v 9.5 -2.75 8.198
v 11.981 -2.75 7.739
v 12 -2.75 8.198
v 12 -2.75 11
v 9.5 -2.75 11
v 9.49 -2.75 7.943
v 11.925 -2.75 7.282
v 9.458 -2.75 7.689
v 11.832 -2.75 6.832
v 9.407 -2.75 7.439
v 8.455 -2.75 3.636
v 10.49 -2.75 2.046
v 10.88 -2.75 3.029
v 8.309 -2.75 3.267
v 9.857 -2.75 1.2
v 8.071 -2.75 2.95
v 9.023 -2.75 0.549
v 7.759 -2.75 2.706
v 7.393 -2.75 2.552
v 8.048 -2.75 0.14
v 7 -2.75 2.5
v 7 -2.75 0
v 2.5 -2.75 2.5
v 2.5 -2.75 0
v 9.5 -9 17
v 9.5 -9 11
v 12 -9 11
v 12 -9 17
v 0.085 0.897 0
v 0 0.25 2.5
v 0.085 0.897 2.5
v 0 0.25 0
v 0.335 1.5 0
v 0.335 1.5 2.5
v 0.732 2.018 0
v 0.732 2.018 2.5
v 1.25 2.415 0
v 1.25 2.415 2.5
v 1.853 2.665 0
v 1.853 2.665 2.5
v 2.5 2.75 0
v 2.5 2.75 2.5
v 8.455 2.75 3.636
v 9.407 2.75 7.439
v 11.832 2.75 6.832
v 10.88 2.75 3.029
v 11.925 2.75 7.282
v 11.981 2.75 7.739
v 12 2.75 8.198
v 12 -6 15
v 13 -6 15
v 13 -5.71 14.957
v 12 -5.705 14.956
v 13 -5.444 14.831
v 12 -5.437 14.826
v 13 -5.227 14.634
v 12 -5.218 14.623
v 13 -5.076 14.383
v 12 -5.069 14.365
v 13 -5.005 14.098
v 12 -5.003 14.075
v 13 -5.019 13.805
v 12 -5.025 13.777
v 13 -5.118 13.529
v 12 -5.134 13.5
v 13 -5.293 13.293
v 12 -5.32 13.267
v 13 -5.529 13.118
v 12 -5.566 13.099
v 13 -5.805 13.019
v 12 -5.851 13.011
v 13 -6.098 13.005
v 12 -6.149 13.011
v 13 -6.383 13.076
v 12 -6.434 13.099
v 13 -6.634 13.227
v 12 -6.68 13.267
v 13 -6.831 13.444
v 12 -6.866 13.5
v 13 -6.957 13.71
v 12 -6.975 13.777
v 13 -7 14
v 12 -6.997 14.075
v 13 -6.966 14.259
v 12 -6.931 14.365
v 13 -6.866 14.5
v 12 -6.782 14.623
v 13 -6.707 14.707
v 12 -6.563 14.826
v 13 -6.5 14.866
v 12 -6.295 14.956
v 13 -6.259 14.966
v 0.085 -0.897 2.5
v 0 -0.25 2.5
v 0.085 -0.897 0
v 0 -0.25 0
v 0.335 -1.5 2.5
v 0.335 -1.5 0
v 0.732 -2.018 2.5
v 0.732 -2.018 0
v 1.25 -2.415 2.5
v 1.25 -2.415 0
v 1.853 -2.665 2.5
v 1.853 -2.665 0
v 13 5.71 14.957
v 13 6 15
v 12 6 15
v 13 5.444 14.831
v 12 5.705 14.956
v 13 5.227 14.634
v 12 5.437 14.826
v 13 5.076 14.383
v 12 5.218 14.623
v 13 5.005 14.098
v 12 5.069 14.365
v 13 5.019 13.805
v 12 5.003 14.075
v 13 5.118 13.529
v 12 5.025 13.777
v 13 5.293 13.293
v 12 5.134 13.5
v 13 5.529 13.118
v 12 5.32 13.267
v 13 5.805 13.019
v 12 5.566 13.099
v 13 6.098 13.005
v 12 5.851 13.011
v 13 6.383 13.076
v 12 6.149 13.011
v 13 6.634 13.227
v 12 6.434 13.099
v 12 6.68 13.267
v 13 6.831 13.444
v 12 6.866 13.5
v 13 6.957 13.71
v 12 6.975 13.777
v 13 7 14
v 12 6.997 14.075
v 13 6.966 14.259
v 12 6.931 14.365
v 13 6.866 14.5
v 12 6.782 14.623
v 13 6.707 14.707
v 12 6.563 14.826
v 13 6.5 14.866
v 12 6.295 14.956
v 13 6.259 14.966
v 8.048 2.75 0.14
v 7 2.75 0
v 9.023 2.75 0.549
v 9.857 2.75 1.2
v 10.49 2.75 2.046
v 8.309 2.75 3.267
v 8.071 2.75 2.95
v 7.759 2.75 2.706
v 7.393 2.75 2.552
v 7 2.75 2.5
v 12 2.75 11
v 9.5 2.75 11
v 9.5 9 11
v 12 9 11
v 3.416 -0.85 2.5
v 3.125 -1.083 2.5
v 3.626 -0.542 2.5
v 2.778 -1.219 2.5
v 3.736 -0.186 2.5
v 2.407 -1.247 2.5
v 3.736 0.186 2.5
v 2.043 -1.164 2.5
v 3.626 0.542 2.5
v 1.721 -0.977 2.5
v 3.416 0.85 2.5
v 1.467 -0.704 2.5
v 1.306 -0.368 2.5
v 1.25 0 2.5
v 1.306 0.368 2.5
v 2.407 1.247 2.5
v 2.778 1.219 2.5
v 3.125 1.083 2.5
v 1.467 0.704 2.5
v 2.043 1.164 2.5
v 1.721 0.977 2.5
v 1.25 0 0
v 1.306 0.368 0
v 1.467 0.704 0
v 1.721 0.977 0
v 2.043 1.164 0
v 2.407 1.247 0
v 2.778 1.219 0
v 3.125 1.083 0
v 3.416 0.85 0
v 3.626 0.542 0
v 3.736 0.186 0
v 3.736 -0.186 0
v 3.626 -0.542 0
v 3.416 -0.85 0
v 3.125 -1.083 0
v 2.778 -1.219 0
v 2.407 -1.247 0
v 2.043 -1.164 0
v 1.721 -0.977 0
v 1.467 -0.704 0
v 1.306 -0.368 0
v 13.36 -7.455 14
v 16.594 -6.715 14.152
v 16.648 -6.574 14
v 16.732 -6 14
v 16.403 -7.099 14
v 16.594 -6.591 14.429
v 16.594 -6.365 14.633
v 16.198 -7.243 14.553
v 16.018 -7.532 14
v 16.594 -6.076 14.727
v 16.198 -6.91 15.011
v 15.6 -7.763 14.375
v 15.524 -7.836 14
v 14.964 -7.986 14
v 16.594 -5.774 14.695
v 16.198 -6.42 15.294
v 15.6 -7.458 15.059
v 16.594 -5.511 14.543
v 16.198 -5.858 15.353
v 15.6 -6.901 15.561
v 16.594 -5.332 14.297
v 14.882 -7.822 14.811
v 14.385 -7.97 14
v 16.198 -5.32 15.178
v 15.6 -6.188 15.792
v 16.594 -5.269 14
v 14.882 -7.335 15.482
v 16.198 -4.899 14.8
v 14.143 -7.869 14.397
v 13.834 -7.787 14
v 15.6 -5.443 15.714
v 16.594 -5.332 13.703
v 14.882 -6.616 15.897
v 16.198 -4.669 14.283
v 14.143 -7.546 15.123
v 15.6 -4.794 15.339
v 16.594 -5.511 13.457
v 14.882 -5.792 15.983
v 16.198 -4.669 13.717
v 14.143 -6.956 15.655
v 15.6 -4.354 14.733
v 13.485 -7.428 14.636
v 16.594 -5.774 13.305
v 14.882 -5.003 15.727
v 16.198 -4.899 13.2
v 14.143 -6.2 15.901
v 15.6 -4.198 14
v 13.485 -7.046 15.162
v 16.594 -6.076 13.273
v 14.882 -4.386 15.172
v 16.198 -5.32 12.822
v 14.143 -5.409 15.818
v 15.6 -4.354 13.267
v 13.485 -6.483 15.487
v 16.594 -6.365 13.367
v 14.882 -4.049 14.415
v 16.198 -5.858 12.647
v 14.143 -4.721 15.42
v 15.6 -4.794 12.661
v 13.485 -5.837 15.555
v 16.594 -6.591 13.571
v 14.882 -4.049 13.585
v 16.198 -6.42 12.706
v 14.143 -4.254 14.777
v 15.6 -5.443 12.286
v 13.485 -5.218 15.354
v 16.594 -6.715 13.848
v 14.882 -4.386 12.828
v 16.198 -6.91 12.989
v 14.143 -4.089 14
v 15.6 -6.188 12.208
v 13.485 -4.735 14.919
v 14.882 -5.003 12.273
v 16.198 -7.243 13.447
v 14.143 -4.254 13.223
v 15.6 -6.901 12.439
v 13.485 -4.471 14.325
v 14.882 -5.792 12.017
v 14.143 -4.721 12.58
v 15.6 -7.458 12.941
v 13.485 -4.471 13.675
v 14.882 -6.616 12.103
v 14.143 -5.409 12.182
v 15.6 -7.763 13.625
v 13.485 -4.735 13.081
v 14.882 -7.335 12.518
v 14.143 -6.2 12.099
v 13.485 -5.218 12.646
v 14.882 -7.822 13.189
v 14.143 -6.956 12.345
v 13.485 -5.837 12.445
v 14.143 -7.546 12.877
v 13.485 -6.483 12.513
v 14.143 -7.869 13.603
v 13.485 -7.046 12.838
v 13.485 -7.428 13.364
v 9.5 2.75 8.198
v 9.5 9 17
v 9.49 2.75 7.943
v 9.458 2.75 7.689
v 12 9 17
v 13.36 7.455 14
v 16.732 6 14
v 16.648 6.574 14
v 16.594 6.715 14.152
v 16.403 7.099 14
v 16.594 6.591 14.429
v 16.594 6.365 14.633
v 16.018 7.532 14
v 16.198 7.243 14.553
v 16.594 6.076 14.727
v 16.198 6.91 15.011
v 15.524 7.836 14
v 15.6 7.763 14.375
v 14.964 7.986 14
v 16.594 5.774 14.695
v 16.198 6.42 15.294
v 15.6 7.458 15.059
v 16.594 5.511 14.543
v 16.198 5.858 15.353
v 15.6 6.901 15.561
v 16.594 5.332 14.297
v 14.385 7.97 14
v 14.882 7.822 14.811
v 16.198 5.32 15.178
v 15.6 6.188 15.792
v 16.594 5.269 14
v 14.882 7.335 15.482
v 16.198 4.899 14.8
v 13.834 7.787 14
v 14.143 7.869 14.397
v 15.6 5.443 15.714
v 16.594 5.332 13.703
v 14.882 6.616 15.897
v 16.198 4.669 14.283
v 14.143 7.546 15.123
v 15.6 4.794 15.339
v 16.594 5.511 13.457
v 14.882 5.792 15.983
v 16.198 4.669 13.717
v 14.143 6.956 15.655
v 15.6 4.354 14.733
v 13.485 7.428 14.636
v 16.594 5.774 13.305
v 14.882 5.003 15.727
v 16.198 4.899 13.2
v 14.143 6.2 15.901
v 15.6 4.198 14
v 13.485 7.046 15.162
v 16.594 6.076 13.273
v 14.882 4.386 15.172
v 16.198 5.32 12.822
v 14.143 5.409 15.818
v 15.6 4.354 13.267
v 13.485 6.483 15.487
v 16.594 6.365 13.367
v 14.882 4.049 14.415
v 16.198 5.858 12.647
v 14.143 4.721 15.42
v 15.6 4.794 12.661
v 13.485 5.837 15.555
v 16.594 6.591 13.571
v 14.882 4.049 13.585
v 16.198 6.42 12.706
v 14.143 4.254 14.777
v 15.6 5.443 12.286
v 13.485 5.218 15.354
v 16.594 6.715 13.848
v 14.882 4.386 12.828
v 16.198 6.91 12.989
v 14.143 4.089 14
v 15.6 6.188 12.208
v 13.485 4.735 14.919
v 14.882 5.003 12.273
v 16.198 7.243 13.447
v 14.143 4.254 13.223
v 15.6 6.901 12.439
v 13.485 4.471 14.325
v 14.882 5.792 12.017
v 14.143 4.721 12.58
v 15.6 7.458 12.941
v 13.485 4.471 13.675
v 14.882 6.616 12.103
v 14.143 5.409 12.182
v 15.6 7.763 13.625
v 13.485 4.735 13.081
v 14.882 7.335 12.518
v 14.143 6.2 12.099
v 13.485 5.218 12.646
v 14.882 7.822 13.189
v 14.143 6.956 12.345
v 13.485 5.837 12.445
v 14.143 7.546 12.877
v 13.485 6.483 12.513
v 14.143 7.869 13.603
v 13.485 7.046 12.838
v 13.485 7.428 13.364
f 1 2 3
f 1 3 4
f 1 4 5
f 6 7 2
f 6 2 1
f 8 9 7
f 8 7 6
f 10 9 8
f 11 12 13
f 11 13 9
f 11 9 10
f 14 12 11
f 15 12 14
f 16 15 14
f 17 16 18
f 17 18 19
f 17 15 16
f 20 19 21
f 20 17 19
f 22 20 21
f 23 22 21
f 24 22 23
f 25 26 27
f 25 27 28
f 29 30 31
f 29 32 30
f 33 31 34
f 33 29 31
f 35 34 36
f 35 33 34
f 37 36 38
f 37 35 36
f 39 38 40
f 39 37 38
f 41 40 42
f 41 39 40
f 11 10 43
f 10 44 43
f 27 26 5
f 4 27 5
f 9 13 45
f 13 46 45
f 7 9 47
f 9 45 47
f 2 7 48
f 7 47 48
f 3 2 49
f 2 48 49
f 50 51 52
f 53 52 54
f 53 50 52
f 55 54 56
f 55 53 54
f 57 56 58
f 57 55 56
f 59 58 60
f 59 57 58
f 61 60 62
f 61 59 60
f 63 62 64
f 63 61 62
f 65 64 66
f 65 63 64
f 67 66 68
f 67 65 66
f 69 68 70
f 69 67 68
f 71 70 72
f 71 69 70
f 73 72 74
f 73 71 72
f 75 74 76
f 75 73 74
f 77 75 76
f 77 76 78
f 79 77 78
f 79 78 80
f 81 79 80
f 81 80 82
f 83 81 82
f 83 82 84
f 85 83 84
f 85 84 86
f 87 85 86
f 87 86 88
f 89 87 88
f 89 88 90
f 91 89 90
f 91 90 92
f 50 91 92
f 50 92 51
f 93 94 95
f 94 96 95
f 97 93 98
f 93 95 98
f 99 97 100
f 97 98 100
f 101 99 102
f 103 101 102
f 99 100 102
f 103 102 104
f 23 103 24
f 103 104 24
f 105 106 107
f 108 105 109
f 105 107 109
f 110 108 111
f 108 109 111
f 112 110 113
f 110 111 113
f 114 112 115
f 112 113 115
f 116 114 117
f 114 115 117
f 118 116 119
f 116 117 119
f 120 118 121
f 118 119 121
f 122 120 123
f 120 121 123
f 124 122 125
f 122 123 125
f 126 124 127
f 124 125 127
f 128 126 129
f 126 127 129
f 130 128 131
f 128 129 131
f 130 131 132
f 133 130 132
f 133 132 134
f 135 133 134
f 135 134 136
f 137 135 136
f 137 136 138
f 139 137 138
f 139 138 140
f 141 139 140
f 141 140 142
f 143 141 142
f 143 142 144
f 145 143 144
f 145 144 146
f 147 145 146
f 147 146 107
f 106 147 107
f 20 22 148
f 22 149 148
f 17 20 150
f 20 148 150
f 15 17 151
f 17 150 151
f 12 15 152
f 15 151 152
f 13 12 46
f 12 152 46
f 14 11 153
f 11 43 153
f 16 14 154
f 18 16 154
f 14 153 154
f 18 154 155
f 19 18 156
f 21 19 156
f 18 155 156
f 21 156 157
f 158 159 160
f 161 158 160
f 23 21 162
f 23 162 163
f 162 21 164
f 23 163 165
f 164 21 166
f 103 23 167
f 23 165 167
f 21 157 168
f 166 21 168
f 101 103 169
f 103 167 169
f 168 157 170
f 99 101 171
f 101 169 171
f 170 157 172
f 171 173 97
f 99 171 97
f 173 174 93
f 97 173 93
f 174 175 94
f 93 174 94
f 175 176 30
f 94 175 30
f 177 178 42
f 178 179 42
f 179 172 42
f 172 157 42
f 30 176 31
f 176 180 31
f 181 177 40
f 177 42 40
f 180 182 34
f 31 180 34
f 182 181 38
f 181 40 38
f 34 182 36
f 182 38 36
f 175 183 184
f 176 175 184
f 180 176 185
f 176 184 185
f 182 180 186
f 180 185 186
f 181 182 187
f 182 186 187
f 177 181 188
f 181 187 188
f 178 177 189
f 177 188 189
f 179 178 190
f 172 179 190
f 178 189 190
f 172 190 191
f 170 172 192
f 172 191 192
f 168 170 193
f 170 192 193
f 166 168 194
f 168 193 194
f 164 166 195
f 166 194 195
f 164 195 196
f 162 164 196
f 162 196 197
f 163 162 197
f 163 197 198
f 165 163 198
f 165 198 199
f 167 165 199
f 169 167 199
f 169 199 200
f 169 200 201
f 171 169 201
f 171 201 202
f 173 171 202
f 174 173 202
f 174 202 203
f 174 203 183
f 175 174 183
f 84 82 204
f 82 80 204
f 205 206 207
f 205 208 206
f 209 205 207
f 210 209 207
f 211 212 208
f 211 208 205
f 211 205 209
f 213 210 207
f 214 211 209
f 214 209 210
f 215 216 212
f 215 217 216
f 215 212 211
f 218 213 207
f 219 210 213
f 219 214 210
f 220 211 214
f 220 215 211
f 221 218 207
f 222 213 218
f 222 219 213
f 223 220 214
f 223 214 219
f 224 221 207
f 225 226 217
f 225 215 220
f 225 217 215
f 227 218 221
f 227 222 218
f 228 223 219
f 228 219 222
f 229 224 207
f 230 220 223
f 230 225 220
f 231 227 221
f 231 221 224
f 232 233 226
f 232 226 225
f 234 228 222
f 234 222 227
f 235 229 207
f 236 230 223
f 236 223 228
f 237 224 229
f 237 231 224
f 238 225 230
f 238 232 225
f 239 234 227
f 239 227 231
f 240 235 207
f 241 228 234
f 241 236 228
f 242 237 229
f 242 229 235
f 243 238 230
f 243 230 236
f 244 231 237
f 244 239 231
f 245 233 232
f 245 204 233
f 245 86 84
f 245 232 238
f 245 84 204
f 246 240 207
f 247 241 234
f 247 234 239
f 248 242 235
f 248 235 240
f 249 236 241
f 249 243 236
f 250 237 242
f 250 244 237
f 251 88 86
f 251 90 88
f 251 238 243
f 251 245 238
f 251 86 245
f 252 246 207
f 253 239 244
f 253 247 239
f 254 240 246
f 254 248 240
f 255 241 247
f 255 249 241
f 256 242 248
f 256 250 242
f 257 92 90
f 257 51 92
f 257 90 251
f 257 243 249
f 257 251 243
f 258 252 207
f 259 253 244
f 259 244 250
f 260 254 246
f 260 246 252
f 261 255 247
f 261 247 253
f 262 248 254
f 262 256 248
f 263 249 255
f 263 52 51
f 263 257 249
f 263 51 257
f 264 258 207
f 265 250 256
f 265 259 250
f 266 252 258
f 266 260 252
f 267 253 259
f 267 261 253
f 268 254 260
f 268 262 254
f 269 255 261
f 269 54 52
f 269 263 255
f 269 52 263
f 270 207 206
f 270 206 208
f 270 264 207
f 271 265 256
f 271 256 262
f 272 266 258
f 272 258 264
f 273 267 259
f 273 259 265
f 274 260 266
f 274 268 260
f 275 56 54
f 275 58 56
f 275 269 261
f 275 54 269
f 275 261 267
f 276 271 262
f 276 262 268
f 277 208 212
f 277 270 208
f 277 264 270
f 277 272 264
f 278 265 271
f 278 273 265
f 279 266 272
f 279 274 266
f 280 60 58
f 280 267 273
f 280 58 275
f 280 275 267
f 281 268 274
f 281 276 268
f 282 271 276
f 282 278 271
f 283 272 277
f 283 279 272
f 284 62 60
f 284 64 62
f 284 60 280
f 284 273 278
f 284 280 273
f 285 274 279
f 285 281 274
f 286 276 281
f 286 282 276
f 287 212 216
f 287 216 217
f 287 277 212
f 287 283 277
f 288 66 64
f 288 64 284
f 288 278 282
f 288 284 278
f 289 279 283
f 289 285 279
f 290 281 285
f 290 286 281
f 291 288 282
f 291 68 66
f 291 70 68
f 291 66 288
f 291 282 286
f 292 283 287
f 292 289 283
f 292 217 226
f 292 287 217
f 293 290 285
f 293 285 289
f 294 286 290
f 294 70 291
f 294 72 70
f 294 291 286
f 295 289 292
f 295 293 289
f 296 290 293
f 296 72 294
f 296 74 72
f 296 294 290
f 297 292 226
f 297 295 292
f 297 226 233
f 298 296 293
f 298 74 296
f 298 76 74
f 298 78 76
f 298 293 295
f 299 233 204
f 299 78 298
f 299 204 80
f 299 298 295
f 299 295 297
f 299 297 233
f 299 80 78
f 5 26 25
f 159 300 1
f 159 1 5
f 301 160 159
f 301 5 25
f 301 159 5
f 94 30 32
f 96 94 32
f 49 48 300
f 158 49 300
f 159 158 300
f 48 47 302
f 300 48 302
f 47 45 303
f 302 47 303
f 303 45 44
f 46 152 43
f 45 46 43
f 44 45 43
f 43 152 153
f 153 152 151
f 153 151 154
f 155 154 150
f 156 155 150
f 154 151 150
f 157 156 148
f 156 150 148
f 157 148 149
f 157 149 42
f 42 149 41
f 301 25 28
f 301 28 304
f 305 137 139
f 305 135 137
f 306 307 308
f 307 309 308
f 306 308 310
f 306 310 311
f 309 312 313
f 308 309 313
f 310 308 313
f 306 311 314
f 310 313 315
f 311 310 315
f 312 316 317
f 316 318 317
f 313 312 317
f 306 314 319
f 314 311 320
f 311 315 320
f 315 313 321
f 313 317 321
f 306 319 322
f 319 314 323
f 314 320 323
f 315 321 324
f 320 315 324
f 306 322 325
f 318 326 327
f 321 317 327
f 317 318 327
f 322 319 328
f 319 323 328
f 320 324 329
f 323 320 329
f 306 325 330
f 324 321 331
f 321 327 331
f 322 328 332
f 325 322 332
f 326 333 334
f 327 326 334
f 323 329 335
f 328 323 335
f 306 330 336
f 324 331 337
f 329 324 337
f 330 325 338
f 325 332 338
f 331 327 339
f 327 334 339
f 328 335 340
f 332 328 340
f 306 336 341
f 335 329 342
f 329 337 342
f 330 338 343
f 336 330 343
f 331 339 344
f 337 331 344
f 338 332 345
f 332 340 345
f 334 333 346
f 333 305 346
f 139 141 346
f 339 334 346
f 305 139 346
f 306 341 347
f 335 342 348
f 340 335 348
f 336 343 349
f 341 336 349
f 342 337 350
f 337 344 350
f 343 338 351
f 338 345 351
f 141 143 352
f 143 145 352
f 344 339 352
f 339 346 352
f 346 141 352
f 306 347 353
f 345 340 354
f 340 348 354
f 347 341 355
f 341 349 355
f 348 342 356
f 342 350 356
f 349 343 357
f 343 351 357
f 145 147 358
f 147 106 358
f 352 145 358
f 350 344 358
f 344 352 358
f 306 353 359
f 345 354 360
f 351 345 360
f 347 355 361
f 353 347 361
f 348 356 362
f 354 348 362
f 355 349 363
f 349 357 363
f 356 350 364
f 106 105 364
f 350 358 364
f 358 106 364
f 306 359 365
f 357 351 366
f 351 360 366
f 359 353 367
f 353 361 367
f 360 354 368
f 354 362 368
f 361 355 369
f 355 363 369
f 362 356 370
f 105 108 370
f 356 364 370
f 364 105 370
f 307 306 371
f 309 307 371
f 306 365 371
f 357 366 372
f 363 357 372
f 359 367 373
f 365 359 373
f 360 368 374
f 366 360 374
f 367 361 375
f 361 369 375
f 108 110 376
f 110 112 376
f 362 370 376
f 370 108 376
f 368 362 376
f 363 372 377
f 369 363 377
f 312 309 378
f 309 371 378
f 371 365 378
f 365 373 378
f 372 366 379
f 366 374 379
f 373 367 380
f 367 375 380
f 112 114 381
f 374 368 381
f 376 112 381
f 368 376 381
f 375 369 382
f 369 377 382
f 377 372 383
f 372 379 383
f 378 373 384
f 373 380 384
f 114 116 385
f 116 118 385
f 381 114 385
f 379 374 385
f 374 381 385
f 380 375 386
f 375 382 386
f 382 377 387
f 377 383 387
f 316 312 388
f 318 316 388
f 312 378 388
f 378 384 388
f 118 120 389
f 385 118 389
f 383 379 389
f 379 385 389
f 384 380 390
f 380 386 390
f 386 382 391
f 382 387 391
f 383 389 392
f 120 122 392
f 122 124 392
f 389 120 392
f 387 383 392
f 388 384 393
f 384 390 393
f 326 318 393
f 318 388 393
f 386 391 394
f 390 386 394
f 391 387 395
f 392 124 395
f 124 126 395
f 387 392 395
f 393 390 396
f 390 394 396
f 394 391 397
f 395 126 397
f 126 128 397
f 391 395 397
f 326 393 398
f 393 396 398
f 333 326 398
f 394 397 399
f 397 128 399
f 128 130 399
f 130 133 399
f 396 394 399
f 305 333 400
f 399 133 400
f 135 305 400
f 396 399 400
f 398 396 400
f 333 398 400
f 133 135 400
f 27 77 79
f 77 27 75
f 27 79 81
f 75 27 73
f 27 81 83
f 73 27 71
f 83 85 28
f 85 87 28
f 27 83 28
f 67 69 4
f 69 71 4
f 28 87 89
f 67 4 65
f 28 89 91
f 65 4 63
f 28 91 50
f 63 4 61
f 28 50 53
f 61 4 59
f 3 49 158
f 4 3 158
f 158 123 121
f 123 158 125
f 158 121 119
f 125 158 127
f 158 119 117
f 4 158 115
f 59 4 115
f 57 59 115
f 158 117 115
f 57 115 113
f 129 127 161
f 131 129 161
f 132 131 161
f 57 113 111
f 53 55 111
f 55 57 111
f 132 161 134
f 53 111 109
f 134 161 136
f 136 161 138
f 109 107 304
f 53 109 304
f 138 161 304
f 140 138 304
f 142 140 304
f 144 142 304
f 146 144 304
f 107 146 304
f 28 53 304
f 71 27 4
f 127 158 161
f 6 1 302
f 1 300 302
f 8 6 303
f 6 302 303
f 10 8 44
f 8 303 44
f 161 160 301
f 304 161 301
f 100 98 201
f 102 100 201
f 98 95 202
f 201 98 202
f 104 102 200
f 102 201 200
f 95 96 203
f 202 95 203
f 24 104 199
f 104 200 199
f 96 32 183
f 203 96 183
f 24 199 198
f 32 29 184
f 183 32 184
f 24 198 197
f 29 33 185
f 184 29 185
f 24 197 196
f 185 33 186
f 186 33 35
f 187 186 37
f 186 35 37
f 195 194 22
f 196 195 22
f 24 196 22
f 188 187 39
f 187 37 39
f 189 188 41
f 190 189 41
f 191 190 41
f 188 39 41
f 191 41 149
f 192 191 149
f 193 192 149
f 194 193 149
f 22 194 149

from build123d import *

# Parameters (mm, degrees)
EXTRUDE_1_DEPTH     = 2.75
SKETCH_2_R          = 1.25
CUT_EXTRUDE_1_DEPTH = 10
FILLET_2_R          = 2.5
SKETCH_4_W          = 6
SKETCH_4_H          = 18
EXTRUDE_2_DEPTH     = 2.5
SKETCH_5_R          = 1
EXTRUDE_3_DEPTH     = 1


with BuildPart() as part:
    # 草图1 → 凸台-拉伸1 (new, symmetric)
    with BuildSketch(Plane(origin=(0, 0, 0), x_dir=(1, 0, 0), z_dir=(0, 1, 0))):
        with BuildLine():
            Line((0, 0), (7, 0))
            ThreePointArc((7, 0), (9.461409331, -0.846991262), (10.880422565, -3.029267947))
            Line((10.880422565, -3.029267947), (11.831813783, -6.832377099))
            ThreePointArc((11.831813783, -6.832377099), (11.957795141, -7.509886755), (12, -8.197716229))
            Line((12, -8.197716229), (12, -17))
            Line((12, -17), (9.5, -17))
            Line((9.5, -17), (9.5, -8.197716229))
            ThreePointArc((9.5, -8.197716229), (9.47654946, -7.815533399), (9.40654968, -7.439084632))
            Line((9.40654968, -7.439084632), (8.455158462, -3.63597548))
            ThreePointArc((8.455158462, -3.63597548), (7.923028499, -2.817621723), (7, -2.5))
            Line((7, -2.5), (0, -2.5))
            Line((0, -2.5), (0, 0))
        make_face()
    extrude(amount=EXTRUDE_1_DEPTH, both=True)

    # 草图2 → 切除-拉伸1 (cut)
    with BuildSketch(Plane(origin=(0, 0, 0), x_dir=(-1, 0, 0), z_dir=(0, 0, -1))):
        with Locations((-2.5, 0)):
            Circle(SKETCH_2_R)
    extrude(amount=-CUT_EXTRUDE_1_DEPTH, mode=Mode.SUBTRACT)

    # 圆角2
    fillet_2_edges = [part.edges().sort_by_distance(p)[0] for p in [
        (0, -2.75, 1.25),
        (0, 2.75, 1.25),
    ]]
    fillet(fillet_2_edges, radius=FILLET_2_R)

    # 草图4 → 凸台-拉伸2 (add)
    with BuildSketch(Plane.ZY.offset(-9.5)):
        with Locations((14, 0)):
            Rectangle(SKETCH_4_W, SKETCH_4_H)
    extrude(amount=-EXTRUDE_2_DEPTH)

    # 草图5 → 凸台-拉伸3 (add)
    with BuildSketch(Plane(origin=(12, 0, 0), x_dir=(0, 0, -1), z_dir=(1, 0, 0))):
        with Locations(Location((-14, 6, 0), (0, 0, 180))):
            Circle(SKETCH_5_R)
    extrude_3 = extrude(amount=EXTRUDE_3_DEPTH)

    # 草图6 → 旋转1 (revolve)
    with BuildSketch(Plane(origin=(0, 0, 14), x_dir=(-1, 0, 0), z_dir=(0, 0, -1))):
        with BuildLine():
            Line((-13, 6), (-16.732050808, 6))
            ThreePointArc((-16.732050808, 6), (-15.249688898, 7.931851653), (-13, 7))
            Line((-13, 7), (-13, 6))
        make_face()
    revolve_1 = revolve(axis=Axis((13, 6, 14), (1, 0, 0)))

    # 镜向1: 凸台-拉伸3, 旋转1 across plane
    add(extrude_3.mirror(Plane.ZX))
    add(revolve_1.mirror(Plane.ZX))


solid = part.part
